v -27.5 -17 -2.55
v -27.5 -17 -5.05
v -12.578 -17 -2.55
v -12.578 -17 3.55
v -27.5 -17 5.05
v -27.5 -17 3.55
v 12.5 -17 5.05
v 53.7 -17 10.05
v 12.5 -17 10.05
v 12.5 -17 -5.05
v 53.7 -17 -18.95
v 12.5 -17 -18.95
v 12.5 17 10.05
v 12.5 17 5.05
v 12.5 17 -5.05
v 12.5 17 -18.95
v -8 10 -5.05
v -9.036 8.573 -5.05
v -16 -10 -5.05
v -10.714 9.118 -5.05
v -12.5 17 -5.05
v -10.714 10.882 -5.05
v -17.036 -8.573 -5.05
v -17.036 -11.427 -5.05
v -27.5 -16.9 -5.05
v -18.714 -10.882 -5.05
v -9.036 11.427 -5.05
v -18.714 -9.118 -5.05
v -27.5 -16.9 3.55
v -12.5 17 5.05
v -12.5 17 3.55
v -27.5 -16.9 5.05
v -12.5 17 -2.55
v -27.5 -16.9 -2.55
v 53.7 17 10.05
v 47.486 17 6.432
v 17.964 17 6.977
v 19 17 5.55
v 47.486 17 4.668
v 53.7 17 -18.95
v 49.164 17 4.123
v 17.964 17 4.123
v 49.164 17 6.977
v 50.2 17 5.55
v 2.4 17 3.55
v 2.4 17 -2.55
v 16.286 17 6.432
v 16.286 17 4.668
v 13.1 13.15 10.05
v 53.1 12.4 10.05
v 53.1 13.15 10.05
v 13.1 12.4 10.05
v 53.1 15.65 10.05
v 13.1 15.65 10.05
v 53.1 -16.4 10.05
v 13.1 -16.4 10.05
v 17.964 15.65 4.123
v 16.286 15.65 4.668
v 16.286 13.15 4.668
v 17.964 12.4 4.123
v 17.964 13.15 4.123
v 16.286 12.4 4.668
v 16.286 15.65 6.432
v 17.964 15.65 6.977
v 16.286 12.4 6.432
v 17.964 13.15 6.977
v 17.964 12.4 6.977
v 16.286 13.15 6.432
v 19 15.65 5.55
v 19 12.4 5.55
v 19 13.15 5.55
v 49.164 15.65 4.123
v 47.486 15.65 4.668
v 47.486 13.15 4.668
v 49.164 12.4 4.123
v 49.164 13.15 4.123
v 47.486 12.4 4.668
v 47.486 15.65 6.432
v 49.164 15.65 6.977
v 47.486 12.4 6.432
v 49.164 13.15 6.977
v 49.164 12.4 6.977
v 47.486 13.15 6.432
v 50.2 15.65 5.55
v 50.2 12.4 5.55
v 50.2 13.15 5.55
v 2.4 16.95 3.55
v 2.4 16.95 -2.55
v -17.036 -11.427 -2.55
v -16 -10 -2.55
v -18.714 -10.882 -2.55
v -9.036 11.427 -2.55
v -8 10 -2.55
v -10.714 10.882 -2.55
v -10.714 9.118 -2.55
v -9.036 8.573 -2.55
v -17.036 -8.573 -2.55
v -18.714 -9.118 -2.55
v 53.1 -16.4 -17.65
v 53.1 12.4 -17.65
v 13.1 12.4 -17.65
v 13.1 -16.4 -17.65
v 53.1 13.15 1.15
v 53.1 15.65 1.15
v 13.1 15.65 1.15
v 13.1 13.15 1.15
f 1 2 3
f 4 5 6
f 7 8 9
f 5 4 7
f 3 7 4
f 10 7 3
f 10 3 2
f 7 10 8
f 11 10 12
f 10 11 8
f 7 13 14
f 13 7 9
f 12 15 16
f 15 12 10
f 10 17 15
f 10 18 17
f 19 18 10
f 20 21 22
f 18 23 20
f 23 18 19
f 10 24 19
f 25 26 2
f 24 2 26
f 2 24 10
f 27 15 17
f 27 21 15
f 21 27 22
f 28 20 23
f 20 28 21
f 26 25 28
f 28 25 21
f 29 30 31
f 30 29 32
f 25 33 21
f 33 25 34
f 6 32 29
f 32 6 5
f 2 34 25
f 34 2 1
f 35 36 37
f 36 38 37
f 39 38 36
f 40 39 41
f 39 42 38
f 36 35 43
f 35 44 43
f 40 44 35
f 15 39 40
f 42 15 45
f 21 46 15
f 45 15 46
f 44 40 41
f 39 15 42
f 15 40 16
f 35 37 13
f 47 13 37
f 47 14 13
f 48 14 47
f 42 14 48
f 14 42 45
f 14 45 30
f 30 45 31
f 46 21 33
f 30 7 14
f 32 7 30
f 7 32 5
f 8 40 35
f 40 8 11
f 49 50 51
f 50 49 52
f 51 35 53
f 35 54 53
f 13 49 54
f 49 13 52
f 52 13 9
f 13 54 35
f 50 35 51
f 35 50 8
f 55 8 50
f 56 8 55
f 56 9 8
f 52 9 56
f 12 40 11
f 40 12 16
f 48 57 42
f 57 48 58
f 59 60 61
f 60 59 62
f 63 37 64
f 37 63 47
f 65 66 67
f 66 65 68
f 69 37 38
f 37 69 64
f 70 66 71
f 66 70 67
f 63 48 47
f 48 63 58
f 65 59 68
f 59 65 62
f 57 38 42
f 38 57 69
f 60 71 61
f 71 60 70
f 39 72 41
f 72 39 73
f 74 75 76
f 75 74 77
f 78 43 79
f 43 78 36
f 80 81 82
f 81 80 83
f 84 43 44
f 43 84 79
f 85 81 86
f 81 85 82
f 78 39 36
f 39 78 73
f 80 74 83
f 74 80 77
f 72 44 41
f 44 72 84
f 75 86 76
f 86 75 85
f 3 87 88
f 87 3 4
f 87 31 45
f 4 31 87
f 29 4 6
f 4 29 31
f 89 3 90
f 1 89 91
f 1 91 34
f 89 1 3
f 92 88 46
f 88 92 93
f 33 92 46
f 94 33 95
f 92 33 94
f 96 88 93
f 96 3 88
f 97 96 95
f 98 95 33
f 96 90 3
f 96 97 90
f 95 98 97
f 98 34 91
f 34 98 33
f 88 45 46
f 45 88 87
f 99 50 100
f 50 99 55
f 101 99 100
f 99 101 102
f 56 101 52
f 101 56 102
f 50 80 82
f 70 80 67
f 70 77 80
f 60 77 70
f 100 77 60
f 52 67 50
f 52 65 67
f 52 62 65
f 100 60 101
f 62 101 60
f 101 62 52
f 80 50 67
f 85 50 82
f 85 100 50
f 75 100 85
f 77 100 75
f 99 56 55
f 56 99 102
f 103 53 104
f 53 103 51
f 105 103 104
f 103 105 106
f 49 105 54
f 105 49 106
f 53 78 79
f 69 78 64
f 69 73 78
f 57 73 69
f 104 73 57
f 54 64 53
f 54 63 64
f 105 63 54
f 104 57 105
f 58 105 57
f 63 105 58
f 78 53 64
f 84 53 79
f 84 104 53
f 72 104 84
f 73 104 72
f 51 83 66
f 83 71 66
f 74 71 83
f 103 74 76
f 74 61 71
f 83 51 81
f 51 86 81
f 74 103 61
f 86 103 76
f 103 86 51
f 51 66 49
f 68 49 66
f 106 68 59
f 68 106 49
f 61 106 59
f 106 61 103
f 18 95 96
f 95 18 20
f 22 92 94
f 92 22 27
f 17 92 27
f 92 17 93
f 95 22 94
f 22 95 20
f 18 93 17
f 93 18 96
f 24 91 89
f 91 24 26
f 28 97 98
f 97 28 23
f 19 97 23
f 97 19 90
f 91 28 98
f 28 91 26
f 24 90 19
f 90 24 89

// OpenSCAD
rubberL=40;
wallT=1.2;
rubberD=9;
bucketX=rubberL+wallT;
bucketY=30;
bucketZ=rubberD+20;
bucketZOff=5;
acrylicT=6.1;
acrylicCUD=15;
acrylicMT=2;
acrylicMX=acrylicCUD+10;
acrylicMY=bucketY;
acrylicMZOff=0.5;
acrylicX1Off=15;
m3r=1.5;
rubberT=2.5;
rubberClampT=2;



module acrylicMount(){
    difference(){
        //solid sahpes
        union(){
            hull(){
                cube([acrylicMX,acrylicMY+rubberClampT*2,acrylicT+acrylicMT*2],center=true);
                translate([-acrylicX1Off/2,-(acrylicMY+rubberClampT*2)/2+0.05,0])
                cube([acrylicMX+acrylicX1Off,0.1,acrylicT+acrylicMT*2],center=true);
            }
            translate([acrylicMX/2+bucketX/2,0,(acrylicT+acrylicMT*2)/2-bucketZ/2+bucketZOff])
                cube([bucketX,bucketY+rubberClampT*2,bucketZ],center=true);
        }
        //acrylic cutout
        translate([-acrylicMX/2+acrylicCUD/2,0,+acrylicMZOff])
            hull(){
                translate([-0.1,(acrylicMY+rubberClampT*2)/2,0])
                    #cube([acrylicCUD,0.1,acrylicT],center=true);
                translate([-acrylicX1Off-0.1,-(acrylicMY+rubberClampT*2)/2,0])
                    #cube([acrylicCUD,0.1,acrylicT],center=true);
            }
        translate([acrylicMX/2+bucketX/2,-rubberClampT,(acrylicT+acrylicMT*2)/2-bucketZ/2+wallT/2+0.1+bucketZOff])
            cube([bucketX-wallT,bucketY-wallT,bucketZ-wallT],center=true);
        translate([acrylicMX/2+bucketX/2,(bucketY+rubberClampT*2)/2-rubberClampT-wallT/2,(acrylicT+acrylicMT*2)/2-rubberD/2+0.1+bucketZOff])
            cube([bucketX-wallT,rubberT,rubberD],center=true);
        //Acrylic clamp holes
        translate([-acrylicMX/2+3,bucketY/2-5,-(acrylicT+acrylicMT)-0.1])
            cylinder(h=acrylicT+acrylicMT*2+0.1, r=m3r);
        translate([-acrylicMX/2+10-acrylicX1Off,-bucketY/2+5,-(acrylicT+acrylicMT)-0.1])
            cylinder(h=acrylicT+acrylicMT*2+0.1, r=m3r);
        //rubber holes
        for(i=[-1,+1]){
            translate([acrylicMX/2+bucketX/2+i*(bucketX/2-5),(bucketY+rubberClampT*2)/2+0.1,(acrylicT+acrylicMT*2)/2-rubberD/2+bucketZOff])
            rotate([90,0,0])
            cylinder(h=rubberClampT*2+rubberT, r=m3r);
        }
    }
 
}


acrylicMount();


//mirror() acrylicMount();
